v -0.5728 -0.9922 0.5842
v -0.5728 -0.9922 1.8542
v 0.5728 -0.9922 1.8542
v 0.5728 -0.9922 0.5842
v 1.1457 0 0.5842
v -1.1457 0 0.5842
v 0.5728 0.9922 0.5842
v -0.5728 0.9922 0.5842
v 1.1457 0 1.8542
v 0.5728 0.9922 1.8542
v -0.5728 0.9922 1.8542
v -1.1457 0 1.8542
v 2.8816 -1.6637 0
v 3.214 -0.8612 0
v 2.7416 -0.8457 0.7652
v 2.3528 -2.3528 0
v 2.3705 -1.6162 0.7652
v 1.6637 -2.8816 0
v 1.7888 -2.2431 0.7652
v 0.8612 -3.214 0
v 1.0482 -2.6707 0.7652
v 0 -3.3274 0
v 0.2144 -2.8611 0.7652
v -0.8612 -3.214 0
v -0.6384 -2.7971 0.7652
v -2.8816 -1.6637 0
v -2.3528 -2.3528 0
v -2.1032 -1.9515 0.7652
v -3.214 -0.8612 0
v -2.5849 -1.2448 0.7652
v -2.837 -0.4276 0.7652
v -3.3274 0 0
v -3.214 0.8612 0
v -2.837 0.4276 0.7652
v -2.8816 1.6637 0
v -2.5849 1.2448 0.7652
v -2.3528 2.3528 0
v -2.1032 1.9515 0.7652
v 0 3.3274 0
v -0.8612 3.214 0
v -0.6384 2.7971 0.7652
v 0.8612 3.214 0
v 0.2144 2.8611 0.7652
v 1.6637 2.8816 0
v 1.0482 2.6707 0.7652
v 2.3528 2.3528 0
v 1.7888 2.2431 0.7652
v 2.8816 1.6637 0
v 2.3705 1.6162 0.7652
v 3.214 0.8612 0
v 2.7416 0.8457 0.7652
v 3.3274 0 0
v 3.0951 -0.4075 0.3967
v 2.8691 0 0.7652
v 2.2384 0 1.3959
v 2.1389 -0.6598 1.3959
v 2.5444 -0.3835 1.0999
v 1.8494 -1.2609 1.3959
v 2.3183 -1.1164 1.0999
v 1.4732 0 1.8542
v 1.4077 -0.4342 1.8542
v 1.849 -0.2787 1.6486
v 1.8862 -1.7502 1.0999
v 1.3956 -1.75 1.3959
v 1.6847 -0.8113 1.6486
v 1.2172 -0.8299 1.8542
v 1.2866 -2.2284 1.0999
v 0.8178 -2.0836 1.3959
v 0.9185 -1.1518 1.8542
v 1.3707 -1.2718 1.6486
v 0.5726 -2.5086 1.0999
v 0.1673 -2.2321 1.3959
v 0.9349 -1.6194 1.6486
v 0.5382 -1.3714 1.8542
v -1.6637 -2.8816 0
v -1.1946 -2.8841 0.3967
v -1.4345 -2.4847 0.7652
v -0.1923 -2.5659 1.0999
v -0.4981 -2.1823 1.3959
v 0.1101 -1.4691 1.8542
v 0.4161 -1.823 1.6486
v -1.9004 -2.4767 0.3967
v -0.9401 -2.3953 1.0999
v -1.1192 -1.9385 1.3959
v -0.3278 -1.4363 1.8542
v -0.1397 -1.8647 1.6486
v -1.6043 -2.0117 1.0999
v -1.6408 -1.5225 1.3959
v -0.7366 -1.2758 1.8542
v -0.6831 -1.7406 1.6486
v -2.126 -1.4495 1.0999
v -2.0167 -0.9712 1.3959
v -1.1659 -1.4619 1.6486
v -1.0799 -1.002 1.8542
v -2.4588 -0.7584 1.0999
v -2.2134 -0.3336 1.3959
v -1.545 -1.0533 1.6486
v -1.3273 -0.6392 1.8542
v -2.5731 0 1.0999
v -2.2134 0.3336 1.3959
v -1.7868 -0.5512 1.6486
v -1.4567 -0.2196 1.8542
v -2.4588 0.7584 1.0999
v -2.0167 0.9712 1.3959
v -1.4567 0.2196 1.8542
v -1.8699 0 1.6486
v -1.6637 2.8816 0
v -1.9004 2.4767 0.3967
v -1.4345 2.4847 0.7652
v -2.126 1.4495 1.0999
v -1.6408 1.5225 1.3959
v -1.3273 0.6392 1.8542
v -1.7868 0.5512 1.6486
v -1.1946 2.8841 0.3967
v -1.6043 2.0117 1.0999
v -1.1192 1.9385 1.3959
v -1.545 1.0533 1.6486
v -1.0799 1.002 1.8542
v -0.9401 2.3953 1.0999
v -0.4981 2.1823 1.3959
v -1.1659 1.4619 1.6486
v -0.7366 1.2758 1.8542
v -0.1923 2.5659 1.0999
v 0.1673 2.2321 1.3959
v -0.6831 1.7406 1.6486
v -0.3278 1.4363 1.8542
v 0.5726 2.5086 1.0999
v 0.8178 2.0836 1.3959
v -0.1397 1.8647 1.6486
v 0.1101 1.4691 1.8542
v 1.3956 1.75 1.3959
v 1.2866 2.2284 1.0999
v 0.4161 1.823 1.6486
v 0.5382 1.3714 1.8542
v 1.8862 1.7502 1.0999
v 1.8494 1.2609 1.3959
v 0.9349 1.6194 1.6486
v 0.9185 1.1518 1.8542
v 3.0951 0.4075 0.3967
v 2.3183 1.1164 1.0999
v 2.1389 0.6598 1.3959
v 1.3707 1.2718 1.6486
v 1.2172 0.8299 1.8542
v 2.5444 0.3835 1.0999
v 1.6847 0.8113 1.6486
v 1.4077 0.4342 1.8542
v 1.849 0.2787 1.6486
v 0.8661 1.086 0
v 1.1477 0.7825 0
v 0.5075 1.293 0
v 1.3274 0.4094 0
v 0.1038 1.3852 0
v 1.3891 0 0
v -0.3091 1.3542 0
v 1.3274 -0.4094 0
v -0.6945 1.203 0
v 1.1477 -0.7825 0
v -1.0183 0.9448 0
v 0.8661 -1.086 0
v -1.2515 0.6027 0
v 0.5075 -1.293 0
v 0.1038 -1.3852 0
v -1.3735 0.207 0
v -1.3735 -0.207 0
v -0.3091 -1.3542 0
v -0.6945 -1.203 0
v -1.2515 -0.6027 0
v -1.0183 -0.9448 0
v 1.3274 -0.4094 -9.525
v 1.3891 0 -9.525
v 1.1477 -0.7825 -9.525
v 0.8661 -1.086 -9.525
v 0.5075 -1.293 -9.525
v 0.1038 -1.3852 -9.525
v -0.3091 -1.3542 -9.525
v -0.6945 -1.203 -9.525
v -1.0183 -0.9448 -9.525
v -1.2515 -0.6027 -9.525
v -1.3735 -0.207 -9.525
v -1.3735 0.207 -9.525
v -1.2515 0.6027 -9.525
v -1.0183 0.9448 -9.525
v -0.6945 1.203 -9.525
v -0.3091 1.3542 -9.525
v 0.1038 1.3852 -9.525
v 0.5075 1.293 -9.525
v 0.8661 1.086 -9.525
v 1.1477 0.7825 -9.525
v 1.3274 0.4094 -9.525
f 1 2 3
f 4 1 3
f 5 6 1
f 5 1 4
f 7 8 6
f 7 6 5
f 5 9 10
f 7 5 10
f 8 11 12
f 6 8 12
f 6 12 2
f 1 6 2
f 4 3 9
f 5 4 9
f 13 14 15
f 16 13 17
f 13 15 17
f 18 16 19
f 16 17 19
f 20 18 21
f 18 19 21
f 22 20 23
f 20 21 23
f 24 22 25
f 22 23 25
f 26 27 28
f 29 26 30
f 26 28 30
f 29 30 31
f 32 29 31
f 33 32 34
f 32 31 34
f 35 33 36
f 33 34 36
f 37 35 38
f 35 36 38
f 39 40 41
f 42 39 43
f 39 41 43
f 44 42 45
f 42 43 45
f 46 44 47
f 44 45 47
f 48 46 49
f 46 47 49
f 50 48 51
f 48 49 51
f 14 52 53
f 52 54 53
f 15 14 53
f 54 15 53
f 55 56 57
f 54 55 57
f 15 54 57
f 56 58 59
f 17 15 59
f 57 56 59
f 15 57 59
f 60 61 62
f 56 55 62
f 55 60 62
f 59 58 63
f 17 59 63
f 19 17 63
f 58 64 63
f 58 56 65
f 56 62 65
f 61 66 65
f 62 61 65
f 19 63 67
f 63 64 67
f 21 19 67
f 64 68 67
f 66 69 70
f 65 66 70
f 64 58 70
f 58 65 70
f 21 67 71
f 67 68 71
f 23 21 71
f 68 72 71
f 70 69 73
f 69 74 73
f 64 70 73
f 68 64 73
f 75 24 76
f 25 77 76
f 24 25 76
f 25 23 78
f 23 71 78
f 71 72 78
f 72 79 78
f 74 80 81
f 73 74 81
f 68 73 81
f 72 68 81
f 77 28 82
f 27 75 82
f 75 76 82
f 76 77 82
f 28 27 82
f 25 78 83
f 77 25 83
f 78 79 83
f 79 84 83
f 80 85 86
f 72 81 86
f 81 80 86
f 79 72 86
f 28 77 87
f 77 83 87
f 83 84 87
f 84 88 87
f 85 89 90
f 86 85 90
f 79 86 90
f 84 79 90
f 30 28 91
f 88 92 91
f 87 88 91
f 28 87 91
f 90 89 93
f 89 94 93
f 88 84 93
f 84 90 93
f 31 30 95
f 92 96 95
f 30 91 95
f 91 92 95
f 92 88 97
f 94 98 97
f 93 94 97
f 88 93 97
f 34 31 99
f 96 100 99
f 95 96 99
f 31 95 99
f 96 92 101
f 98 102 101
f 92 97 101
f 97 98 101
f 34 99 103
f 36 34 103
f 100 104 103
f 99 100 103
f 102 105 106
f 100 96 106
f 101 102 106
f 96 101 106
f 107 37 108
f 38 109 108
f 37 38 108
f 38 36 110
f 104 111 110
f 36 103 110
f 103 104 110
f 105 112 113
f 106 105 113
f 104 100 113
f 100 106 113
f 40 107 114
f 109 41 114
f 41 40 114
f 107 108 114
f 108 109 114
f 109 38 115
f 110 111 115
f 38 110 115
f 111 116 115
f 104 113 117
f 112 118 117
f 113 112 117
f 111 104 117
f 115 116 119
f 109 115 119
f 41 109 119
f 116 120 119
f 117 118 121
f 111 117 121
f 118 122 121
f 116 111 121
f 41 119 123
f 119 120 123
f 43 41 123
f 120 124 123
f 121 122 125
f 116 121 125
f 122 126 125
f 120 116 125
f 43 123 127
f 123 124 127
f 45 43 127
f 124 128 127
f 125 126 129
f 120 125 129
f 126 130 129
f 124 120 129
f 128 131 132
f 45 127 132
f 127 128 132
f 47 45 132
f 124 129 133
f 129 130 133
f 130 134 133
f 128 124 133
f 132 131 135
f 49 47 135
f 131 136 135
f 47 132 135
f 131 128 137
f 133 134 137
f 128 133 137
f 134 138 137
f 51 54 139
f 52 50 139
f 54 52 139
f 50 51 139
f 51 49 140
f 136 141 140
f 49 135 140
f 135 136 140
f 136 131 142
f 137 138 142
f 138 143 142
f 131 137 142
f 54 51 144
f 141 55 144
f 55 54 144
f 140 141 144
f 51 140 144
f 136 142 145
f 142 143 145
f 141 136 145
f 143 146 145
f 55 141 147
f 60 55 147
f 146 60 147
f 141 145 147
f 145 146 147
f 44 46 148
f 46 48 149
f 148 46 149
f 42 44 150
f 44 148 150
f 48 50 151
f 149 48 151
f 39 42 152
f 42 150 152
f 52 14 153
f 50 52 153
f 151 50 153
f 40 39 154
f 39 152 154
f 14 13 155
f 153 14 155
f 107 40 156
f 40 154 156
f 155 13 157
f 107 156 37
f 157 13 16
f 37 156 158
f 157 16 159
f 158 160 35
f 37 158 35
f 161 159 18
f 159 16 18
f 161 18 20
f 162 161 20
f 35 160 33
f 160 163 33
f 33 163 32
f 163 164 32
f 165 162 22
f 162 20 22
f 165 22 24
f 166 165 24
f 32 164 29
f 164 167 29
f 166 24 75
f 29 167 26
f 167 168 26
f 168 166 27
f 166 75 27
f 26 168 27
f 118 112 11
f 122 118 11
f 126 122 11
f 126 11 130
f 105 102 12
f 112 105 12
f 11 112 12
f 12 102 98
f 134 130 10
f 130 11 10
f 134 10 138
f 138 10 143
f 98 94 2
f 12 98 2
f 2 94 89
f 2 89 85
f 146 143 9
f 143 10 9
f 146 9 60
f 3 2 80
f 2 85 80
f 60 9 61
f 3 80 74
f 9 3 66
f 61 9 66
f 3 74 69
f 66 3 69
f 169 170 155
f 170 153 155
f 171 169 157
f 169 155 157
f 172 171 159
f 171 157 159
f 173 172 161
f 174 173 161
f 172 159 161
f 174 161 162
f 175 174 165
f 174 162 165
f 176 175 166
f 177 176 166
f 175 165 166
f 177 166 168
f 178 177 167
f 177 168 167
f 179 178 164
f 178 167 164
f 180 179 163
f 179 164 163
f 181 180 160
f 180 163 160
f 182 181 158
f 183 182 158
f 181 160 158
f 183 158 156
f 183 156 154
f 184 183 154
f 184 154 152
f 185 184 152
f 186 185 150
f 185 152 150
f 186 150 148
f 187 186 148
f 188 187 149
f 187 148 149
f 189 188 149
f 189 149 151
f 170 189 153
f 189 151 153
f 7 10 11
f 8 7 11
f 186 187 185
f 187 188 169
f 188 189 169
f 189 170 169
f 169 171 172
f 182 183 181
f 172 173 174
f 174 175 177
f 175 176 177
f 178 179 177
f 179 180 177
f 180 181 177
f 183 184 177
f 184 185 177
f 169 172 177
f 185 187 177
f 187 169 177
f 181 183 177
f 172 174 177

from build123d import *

# Parameters (mm, degrees)
F3_DEPTH = 1.27


with BuildPart() as f1:
    # F0 (on Front) → F1 (revolve)
    with BuildSketch(Plane.XZ):
        with BuildLine():
            Line((1.389063, -9.525), (1.389063, 0))
            Line((1.389063, 0), (3.3274, 0))
            ThreePointArc((3.3274, 0), (2.573122, 1.099922), (1.4732, 1.8542))
            Line((1.4732, 1.8542), (0, 1.8542))
            Line((0, 1.8542), (0, 0))
            Line((0, 0), (0, -9.525))
            Line((0, -9.525), (1.389063, -9.525))
        make_face()
    revolve(axis=Axis((0, 0, -4.7625), (0, 0, -1)))

    # F2 (on face) → F3 (cut)
    with BuildSketch(Plane.XY.offset(1.8542)):
        Polygon((0.57284, 0.992188), (-0.57284, 0.992188), (-1.145679, 0), (-0.57284, -0.992188), (0.57284, -0.992188), (1.145679, 0), align=None)
    extrude(amount=-F3_DEPTH, mode=Mode.SUBTRACT)


solid = f1.part
